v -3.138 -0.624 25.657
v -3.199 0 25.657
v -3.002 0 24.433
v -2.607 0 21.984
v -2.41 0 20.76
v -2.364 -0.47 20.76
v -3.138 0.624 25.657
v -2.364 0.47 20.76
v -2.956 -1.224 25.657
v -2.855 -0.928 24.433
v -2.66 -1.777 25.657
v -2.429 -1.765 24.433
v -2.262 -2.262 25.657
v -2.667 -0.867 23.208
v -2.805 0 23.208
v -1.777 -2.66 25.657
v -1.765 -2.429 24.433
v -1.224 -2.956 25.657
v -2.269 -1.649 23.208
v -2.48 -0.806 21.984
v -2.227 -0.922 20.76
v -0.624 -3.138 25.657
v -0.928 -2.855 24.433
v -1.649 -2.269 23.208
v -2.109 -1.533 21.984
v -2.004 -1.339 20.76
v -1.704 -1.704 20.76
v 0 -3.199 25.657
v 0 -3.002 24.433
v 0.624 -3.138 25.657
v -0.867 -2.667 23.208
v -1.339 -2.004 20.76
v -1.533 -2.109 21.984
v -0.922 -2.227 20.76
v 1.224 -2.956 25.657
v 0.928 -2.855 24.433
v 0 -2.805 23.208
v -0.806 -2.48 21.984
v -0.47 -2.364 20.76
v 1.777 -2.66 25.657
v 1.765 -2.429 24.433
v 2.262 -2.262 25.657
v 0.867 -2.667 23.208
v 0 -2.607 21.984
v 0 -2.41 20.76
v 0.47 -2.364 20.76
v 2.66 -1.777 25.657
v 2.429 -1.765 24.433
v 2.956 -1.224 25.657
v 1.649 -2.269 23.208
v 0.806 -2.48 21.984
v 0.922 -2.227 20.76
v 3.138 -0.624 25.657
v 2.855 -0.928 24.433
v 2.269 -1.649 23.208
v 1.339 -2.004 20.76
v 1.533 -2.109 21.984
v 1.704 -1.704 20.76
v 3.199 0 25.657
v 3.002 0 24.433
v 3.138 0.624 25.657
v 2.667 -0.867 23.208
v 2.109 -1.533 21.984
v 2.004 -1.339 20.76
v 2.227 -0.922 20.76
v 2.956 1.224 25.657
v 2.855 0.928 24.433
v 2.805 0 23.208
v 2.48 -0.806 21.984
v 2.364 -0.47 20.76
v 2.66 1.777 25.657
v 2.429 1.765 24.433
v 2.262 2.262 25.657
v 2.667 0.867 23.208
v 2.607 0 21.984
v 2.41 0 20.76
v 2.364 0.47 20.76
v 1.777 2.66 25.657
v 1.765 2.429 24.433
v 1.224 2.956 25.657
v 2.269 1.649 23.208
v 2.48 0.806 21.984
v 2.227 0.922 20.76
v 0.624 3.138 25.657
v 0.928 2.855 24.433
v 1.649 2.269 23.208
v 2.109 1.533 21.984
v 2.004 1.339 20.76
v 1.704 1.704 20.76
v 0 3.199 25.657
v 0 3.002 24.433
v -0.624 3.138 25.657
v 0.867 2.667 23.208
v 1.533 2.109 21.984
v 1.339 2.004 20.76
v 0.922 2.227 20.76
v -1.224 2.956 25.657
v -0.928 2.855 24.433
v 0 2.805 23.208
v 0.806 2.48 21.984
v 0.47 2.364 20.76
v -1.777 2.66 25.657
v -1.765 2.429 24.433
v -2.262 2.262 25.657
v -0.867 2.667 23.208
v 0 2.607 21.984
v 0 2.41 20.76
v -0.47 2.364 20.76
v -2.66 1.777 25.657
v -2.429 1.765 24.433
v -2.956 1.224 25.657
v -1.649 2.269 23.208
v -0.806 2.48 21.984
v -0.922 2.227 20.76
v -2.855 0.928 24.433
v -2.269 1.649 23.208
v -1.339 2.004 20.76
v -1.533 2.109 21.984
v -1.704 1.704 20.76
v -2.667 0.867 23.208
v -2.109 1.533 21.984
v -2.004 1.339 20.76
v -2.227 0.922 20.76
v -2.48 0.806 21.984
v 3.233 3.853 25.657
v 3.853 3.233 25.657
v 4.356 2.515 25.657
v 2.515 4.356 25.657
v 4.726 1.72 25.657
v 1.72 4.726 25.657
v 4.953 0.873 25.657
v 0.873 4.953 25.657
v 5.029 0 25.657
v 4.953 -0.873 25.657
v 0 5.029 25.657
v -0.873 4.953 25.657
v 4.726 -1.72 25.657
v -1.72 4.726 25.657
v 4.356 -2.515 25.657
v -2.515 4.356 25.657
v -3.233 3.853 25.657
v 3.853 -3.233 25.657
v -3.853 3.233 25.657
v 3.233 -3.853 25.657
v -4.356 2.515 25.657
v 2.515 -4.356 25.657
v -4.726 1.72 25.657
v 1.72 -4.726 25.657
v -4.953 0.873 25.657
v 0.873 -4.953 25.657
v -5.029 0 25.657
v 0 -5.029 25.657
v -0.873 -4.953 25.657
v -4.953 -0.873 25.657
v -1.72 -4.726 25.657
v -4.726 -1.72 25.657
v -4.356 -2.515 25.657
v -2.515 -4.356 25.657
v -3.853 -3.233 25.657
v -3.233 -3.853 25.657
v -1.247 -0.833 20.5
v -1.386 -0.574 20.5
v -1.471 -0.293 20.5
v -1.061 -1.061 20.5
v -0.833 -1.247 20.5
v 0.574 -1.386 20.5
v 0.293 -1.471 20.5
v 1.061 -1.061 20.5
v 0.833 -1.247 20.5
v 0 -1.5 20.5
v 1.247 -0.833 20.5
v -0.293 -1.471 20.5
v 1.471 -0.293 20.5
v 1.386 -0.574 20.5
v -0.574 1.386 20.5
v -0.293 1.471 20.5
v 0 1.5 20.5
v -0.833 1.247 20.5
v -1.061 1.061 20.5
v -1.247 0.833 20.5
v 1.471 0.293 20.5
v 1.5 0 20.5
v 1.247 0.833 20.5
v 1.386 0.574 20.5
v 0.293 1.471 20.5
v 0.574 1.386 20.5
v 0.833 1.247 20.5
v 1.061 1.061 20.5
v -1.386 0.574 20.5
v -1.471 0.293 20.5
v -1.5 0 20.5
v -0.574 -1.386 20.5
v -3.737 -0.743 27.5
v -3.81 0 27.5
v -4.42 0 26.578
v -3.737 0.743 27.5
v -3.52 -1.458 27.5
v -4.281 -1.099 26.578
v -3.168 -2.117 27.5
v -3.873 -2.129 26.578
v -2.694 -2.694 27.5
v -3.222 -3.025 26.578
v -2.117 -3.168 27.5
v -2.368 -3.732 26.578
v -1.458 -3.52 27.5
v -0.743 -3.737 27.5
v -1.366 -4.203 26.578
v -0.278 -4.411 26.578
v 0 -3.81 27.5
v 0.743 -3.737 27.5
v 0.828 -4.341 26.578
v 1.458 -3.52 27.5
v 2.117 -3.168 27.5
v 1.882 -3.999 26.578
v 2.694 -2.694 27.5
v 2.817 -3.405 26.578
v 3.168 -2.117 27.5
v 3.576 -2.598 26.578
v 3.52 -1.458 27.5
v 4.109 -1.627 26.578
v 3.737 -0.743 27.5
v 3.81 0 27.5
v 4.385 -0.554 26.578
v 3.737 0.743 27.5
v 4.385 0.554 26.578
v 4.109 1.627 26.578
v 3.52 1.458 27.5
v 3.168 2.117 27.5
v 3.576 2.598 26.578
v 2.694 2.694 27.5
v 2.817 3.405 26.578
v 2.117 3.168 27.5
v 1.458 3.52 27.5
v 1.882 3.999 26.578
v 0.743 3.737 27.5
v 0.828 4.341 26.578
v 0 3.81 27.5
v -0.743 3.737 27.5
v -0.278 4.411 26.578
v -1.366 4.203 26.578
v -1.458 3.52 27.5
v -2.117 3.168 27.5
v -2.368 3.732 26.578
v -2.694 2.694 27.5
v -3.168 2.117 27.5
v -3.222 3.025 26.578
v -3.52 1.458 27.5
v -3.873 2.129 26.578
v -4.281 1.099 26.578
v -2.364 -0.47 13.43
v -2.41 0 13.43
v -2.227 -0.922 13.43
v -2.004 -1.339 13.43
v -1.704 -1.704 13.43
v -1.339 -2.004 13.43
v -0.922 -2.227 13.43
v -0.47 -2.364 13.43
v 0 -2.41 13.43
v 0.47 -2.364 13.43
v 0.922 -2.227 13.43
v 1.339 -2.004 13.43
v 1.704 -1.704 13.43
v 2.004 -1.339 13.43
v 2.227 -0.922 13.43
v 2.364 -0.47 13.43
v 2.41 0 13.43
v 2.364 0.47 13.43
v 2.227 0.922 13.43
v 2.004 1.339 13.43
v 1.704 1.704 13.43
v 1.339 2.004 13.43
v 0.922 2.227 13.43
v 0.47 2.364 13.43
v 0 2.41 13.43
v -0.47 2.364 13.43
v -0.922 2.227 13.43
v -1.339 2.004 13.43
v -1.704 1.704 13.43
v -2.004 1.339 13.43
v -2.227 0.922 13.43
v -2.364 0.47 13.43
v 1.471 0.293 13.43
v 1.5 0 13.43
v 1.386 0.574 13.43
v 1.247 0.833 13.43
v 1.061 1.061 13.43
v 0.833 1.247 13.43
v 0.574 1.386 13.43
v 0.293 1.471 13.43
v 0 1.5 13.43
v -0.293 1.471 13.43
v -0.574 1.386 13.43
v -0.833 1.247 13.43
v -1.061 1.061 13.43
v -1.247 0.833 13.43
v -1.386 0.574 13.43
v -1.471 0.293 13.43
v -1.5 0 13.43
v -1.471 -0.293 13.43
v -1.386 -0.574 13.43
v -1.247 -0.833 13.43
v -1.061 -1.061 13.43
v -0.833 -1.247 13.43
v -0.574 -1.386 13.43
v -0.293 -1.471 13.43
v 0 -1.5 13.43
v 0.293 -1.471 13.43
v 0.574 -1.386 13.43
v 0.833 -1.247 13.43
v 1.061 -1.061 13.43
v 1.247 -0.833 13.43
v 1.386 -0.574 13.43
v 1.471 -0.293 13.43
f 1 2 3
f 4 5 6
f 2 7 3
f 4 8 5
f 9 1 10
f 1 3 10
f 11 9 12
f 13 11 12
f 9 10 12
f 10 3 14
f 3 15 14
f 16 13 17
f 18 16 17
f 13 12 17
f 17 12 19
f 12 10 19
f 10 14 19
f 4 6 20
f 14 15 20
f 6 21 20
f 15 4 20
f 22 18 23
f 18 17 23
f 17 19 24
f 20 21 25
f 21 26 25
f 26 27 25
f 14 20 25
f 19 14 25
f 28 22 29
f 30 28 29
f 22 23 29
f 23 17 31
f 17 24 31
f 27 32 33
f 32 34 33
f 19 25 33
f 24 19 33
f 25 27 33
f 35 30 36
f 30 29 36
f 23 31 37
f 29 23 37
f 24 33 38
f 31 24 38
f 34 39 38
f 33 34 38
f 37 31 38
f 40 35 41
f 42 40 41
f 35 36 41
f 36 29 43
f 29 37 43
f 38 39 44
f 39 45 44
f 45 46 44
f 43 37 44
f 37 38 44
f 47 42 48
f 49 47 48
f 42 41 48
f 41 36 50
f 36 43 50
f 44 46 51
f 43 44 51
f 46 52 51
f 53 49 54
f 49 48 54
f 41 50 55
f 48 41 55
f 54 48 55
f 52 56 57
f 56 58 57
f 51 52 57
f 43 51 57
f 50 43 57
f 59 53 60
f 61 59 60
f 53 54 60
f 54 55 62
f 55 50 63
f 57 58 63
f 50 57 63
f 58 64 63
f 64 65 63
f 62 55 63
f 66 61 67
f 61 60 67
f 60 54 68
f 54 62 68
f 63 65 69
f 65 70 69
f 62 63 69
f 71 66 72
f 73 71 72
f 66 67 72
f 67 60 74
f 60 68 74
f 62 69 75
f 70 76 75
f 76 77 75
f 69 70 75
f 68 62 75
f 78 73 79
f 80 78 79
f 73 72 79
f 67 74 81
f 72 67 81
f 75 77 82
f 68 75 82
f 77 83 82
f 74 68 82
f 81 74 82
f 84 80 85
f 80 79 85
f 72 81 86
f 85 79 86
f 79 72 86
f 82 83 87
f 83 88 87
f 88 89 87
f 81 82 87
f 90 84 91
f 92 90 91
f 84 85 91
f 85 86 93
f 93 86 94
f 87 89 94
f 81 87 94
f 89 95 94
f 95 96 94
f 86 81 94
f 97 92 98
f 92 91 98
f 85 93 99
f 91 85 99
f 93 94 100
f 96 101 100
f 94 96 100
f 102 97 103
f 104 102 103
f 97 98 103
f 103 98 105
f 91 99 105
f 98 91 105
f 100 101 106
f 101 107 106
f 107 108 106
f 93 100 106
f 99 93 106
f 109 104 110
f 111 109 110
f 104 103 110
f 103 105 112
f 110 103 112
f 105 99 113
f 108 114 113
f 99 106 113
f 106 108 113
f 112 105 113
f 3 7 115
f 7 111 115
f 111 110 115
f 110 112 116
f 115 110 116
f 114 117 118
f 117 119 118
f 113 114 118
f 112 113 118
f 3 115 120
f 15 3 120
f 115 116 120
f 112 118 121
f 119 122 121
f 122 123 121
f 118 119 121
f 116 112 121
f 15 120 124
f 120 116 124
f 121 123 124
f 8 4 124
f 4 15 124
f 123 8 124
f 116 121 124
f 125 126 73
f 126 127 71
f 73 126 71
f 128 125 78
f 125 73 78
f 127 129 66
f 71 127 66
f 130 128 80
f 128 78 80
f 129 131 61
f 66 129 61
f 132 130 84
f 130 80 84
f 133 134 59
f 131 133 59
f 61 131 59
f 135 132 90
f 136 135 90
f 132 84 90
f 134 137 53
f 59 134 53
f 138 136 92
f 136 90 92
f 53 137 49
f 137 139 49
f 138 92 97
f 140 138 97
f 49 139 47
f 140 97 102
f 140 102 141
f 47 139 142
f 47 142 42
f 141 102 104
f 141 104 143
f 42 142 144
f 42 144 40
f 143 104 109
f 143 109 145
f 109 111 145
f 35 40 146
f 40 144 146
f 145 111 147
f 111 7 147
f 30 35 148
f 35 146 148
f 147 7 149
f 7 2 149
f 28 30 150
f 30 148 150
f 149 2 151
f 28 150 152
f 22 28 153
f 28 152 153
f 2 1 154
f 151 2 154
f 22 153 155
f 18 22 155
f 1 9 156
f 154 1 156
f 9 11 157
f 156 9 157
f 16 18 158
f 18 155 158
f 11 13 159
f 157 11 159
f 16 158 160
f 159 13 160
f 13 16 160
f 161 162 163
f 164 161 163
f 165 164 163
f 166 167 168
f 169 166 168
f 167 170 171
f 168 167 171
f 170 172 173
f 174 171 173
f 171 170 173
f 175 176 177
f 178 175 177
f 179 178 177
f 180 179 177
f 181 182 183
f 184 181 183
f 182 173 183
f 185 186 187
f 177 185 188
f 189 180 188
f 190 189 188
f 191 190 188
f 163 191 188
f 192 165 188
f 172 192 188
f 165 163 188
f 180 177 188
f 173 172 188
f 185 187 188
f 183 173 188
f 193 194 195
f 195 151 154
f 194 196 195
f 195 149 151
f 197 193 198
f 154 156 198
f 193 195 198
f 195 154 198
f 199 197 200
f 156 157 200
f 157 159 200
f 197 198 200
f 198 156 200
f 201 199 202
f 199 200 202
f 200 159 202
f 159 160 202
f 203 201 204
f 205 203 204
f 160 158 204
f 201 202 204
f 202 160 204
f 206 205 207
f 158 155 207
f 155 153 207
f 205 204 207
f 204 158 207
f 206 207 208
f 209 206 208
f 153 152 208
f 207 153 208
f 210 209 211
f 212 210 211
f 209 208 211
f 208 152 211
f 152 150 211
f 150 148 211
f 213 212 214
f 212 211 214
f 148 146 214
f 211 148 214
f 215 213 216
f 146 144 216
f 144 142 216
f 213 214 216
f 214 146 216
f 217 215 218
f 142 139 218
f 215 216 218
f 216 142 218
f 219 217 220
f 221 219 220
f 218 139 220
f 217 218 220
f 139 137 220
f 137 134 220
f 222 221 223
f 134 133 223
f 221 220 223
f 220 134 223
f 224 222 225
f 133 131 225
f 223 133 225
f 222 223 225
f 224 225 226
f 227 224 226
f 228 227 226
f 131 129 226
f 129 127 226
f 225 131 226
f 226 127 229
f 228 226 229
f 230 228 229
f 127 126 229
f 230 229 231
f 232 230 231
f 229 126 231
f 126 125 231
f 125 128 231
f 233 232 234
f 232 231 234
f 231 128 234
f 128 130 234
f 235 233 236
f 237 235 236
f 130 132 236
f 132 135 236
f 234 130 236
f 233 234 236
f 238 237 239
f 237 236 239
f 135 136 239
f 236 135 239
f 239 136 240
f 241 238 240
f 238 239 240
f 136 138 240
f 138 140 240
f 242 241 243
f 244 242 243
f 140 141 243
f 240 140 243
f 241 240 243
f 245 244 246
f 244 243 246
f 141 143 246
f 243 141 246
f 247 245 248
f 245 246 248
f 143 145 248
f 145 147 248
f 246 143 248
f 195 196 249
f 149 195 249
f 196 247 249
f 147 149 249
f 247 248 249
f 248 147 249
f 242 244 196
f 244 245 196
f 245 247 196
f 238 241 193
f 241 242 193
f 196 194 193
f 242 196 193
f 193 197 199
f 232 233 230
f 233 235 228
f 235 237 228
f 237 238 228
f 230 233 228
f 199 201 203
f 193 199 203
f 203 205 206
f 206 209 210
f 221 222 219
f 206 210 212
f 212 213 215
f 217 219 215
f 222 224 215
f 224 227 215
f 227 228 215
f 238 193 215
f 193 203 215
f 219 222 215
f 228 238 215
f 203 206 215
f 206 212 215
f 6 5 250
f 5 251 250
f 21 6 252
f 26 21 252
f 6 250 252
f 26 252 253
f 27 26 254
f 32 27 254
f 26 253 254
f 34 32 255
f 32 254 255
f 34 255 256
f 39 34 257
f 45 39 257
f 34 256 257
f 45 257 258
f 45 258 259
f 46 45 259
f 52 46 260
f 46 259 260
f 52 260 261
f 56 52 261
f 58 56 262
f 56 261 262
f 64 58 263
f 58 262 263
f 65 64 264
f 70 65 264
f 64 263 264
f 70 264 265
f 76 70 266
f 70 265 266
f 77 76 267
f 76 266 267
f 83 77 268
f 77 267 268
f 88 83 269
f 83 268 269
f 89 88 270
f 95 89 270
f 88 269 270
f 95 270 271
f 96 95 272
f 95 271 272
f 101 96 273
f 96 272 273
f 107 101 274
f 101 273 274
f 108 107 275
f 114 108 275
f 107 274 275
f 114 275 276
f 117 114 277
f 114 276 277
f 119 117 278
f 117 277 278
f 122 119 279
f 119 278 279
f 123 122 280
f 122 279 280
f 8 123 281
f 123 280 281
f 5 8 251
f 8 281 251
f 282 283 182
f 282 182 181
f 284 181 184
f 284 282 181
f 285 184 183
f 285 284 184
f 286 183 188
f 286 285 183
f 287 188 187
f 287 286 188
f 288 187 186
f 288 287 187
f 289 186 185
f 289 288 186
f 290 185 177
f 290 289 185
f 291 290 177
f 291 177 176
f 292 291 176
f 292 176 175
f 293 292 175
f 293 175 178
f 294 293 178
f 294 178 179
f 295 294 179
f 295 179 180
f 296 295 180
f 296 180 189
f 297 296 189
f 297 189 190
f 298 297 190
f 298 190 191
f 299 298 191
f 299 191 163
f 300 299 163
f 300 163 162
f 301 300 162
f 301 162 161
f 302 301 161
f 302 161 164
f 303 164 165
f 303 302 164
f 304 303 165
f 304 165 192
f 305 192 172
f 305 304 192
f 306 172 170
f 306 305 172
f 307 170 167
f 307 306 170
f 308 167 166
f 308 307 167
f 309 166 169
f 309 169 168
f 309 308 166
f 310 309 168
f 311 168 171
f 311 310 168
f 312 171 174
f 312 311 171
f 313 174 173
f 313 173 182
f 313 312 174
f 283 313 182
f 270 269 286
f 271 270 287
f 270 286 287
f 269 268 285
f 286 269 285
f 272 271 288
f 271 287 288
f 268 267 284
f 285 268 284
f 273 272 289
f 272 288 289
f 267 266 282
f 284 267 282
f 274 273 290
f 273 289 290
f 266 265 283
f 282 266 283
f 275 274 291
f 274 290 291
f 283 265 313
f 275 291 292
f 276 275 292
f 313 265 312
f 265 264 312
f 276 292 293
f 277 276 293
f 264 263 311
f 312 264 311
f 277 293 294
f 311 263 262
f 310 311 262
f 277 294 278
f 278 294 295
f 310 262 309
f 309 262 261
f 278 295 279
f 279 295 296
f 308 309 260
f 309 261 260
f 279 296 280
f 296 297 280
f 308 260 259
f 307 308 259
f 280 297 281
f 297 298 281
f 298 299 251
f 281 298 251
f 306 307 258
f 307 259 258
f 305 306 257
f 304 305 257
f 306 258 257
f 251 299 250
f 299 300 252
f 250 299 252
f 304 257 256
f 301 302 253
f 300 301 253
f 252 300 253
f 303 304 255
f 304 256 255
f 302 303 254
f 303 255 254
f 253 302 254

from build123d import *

# Parameters (mm, degrees)
CYLINDER014_R     = 1.5
CYLINDER014_DEPTH = 10


with BuildPart() as zylinder014:
    # Cylinder014 → Cylinder014 (new body)
    with BuildSketch(Plane.XY.offset(-17)):
        Circle(CYLINDER014_R)
    extrude(amount=CYLINDER014_DEPTH)


with BuildPart() as cut016:
    # Sketch006 → Revolve001 (revolve)
    with BuildSketch(Plane.XZ):
        Polygon((0, 0), (-3.81, 0), (-5.029301, -1.843205), (-3.199301, -1.843205), (-2.41, -6.74), (-2.41, -14.07), (0, -14.07), align=None)
    revolve(axis=Axis((0, 0, 0), (0, 0, 1)))

    # Cut016: cut Zylinder014
    add(zylinder014.part, mode=Mode.SUBTRACT)


with BuildPart() as cut016_1:
    # Cut016 placement: moved
    add(cut016.part.moved(Location((0, 0, 27.5))))


solid = cut016_1.part
